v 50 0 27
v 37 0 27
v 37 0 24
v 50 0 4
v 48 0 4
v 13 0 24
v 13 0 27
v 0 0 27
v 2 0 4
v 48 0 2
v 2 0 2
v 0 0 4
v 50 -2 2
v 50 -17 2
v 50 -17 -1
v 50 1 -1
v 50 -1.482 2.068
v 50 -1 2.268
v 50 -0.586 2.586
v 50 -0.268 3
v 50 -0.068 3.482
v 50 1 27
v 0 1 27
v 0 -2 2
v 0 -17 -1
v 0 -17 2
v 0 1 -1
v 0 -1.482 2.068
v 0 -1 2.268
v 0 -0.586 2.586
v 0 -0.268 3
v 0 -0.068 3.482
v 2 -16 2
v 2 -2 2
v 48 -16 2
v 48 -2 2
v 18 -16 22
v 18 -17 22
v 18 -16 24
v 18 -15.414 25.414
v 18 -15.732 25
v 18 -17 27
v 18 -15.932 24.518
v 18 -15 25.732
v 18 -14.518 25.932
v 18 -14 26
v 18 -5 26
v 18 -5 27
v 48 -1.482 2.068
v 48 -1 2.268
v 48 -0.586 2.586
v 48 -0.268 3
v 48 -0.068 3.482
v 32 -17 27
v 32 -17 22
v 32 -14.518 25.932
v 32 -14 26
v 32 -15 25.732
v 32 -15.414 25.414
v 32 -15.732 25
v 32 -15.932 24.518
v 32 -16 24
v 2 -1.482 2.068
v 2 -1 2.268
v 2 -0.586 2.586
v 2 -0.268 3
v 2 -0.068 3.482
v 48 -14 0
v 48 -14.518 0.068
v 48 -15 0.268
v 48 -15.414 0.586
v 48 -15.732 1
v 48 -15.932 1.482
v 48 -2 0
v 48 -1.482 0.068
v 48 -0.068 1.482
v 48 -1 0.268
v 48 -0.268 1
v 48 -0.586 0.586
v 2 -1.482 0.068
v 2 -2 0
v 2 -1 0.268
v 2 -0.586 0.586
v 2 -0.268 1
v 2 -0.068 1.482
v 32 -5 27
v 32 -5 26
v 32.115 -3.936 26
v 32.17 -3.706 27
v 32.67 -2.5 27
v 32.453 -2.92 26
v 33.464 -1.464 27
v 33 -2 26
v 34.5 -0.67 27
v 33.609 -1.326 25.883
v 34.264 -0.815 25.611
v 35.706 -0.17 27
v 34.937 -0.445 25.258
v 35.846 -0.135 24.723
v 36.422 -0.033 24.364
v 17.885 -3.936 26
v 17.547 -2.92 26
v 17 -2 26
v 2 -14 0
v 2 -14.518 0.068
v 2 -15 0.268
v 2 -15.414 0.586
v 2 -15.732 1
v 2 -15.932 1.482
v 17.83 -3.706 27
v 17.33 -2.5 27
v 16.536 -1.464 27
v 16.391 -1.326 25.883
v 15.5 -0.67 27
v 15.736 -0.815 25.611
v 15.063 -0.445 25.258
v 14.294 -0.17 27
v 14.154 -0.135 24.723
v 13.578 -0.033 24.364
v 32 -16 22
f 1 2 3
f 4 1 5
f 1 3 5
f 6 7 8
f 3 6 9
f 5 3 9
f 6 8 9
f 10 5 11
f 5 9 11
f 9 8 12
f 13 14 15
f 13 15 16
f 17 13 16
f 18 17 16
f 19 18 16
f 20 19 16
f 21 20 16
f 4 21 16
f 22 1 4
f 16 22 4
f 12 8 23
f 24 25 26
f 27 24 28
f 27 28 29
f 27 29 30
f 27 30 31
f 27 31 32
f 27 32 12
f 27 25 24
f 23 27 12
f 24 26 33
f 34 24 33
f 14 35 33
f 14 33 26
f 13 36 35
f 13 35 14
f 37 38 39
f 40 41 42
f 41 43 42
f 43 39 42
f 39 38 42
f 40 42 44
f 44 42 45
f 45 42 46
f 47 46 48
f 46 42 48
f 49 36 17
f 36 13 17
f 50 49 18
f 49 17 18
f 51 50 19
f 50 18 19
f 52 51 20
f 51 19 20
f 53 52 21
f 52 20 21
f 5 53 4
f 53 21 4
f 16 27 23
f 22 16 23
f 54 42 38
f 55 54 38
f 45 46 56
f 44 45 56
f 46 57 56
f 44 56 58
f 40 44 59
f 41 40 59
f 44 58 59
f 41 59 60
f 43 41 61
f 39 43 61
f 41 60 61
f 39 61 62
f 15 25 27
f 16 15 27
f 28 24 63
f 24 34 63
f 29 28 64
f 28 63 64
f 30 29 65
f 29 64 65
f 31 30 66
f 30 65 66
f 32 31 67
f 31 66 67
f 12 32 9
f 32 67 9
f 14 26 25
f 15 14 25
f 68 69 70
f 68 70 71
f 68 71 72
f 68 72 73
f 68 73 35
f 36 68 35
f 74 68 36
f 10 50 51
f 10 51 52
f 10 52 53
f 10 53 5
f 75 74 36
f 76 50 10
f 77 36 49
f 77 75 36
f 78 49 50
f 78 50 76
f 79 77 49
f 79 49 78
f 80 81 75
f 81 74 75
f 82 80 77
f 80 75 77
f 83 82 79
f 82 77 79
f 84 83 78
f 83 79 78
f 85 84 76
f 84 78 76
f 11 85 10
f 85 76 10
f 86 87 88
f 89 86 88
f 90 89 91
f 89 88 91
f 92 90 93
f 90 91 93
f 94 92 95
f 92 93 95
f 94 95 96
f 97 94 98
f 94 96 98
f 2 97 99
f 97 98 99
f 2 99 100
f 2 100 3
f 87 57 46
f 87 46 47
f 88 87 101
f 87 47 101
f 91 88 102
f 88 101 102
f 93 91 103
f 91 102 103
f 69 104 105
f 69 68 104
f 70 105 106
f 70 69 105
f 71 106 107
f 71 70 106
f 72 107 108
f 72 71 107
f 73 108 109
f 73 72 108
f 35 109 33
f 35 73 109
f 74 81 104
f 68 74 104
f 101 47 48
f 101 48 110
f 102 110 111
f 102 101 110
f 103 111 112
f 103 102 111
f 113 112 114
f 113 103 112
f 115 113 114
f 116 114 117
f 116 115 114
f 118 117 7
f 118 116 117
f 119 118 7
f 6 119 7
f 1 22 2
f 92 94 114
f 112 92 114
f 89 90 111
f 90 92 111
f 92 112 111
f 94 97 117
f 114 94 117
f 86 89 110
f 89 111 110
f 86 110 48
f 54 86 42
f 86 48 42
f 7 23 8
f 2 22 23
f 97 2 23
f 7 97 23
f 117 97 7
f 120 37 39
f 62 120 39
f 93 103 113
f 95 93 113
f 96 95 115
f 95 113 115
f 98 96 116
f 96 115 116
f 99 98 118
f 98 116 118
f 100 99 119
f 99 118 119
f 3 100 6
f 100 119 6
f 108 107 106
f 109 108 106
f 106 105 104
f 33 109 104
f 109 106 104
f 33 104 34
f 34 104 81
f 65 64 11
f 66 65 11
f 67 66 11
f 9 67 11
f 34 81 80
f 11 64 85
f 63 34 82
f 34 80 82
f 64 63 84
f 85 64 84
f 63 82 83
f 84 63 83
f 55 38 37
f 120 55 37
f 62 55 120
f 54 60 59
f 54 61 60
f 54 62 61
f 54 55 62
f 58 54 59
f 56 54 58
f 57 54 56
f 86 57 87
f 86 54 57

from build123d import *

# Parameters (mm, degrees)
F1_DEPTH = 50
F2_W     = 2
F2_H     = 16
F3_DEPTH = 2
F4_W     = 18
F4_H     = 17
F5_DEPTH = 25
F7_R     = 5
F8_R     = 1.9999


# Not quite as in the source:
# - a fillet or chamfer is up to 0.001 mm smaller than in the source, because OpenCascade refuses the exact size
# - a feature of the source that left no trace in its solid (it failed there, or was rolled back) is left out


with BuildPart() as f1:
    # F0 (on Right) → F1 (new body)
    with BuildSketch(Plane.YZ):
        Polygon((0, 26), (0, 0), (-16, 0), (-16, 2), (-17, 2), (-17, -1), (1, -1), (1, 26), align=None)
        Polygon((-16, 26), (0, 26), (1, 26), (1, 27), (-17, 27), (-17, 22), (-16, 22), align=None)
    extrude(amount=F1_DEPTH)

    # F2 (on face) → F3 (join)
    with BuildSketch(Plane.XY):
        with Locations((1, -8)):
            Rectangle(F2_W, F2_H)
        with Locations((49, -8)):
            Rectangle(F2_W, F2_H)
    extrude(amount=F3_DEPTH)

    # F4 (on face) → F5 (cut)
    with BuildSketch(Plane.XY.offset(27)):
        with Locations((9, -8.5)):
            Rectangle(F4_W, F4_H)
        with Locations((41, -8.5)):
            Rectangle(F4_W, F4_H)
    extrude(amount=-F5_DEPTH, mode=Mode.SUBTRACT)

    # F7
    f7_edges = [f1.edges().sort_by_distance(p)[0] for p in [
        (32, 0, 26.5),
        (18, 0, 26.5),
    ]]
    fillet(f7_edges, radius=F7_R)

    # F8 (radius 2 in the source; OpenCascade refuses exactly that, so slightly less here)
    f8_edges = [f1.edges().sort_by_distance(p)[0] for p in [
        (25, -16, 0),
        (1, 0, 2),
        (25, 0, 26),
        (25, 0, 0),
        (49, 0, 2),
        (25, -16, 26),
    ]]
    fillet(f8_edges, radius=F8_R)


solid = f1.part
